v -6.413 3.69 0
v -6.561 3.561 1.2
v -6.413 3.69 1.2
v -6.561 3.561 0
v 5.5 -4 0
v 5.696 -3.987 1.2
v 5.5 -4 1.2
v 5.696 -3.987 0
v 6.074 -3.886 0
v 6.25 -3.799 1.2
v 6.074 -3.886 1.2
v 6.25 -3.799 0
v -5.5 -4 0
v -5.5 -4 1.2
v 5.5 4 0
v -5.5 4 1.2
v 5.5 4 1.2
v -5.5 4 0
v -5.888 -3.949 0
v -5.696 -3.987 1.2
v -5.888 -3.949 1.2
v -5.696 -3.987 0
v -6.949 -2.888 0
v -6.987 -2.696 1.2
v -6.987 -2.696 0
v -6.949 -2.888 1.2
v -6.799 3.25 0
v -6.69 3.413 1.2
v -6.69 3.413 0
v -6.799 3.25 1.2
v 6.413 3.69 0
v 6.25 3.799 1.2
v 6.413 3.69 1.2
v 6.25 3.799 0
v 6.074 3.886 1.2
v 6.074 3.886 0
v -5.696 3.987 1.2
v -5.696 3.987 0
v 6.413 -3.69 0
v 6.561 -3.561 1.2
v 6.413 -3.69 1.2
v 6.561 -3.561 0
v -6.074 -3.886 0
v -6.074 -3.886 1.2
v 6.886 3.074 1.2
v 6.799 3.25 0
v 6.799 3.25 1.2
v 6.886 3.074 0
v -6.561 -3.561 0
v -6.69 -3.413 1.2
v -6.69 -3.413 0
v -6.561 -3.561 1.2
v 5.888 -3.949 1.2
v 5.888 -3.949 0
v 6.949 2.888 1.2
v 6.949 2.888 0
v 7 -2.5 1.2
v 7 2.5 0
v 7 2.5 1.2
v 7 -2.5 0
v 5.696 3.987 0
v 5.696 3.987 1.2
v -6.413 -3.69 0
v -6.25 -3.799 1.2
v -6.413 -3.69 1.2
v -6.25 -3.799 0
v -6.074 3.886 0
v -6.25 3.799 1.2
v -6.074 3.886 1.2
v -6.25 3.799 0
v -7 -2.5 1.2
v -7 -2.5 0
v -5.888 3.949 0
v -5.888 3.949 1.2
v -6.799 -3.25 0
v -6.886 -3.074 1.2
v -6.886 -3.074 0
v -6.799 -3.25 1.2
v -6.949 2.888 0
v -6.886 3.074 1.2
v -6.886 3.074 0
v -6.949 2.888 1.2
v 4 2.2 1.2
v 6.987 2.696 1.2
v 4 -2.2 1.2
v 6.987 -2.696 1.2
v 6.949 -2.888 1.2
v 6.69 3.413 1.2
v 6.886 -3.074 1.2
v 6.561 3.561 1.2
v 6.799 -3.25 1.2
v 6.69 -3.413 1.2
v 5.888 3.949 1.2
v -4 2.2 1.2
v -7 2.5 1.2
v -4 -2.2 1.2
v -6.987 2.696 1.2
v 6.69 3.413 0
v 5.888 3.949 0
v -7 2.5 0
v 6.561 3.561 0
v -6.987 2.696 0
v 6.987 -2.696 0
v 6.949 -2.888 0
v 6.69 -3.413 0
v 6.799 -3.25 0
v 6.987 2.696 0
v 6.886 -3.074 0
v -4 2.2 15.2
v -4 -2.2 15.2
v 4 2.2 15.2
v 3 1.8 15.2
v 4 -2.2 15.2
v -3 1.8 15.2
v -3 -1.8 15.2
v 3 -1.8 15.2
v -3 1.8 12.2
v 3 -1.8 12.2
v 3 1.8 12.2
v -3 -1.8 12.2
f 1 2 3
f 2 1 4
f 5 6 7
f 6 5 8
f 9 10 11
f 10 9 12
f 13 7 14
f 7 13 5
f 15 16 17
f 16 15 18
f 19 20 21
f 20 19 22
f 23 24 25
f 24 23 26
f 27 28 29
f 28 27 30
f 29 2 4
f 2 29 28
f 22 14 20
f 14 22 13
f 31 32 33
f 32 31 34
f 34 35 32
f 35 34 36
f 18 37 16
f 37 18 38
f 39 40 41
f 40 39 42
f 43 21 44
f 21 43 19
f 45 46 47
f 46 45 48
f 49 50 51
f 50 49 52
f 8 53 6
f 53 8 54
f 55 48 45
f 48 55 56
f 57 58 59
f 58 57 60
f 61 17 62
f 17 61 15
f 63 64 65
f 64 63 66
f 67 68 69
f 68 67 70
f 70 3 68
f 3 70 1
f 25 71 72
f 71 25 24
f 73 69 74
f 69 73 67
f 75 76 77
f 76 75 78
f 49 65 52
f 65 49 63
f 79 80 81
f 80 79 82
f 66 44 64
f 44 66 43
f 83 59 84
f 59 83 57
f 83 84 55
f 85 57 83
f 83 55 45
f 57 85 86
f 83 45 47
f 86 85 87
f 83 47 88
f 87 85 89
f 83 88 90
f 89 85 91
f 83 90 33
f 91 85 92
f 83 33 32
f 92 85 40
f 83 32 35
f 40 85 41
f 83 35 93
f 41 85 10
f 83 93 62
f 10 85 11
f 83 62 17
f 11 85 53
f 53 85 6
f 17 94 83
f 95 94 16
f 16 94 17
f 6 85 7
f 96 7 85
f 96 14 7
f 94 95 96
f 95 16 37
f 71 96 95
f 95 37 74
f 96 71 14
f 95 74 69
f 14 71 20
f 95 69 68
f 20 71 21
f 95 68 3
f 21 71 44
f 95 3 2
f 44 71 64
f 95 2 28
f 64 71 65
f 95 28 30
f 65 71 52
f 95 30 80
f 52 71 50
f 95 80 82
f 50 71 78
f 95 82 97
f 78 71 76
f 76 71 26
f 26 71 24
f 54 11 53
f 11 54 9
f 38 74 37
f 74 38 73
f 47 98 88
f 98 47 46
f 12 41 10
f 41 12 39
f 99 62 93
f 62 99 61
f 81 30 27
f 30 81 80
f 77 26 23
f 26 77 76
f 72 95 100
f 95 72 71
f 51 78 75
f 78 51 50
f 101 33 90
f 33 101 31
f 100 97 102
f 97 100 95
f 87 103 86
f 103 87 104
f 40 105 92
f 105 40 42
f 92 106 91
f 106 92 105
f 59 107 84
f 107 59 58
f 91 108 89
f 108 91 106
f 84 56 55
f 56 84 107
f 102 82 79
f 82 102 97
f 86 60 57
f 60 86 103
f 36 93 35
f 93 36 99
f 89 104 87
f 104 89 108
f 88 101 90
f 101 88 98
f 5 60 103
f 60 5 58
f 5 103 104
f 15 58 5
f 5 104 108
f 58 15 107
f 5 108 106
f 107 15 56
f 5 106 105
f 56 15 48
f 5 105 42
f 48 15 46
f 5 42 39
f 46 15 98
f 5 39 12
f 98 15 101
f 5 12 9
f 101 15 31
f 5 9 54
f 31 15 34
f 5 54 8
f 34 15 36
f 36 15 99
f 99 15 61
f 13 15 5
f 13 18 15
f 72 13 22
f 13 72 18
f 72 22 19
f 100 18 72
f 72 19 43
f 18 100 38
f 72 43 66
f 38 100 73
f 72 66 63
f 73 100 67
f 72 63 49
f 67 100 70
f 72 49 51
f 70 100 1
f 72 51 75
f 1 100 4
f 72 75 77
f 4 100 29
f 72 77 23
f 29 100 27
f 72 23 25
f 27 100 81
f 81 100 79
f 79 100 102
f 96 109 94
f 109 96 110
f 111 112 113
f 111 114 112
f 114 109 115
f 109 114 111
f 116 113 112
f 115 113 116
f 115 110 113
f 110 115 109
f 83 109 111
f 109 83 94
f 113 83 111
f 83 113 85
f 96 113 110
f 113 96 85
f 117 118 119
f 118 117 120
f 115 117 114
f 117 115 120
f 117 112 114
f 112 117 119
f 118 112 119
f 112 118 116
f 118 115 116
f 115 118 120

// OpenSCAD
// ============================================================
// tx_switch_cap.scad  -  Gesture TX enclosure, SWITCH CAP
// Rebuilt as editable OpenSCAD from tx_switch_cap.stl
// Units: mm. Same coordinates as the STL, centred on X=0, Y=0.
// Dimensions were measured from cross-sections of the STL (about +/-0.05 mm).
// ============================================================

$fn = 48;

// ---- Overlay the original STL as a ghost, to compare ----
show_original = false;                // true = also draw the original STL
original_file = "tx_switch_cap.stl";  // keep it next to this .scad file

// ---- Flange (sits against the inside of the lid) ----
flange_w = 14;     // X
flange_d = 8;      // Y
flange_t = 1.2;    // thickness
flange_r = 1.5;    // corner radius

// ---- Stem (passes through the lid switch window) ----
stem_w = 8;        // X
stem_d = 4.4;      // Y
total_h = 15.2;    // overall height

// ---- Socket in the top of the stem (fits over the switch button) ----
sock_w = 6;        // X
sock_d = 3.6;      // Y
sock_z = 12.2;     // socket floor height; open above this

// ============================================================
module rrect2d(w, d, r) {
  offset(r = r) square([w - 2*r, d - 2*r], center = true);
}

difference() {
  union() {
    linear_extrude(height = flange_t) rrect2d(flange_w, flange_d, flange_r);
    translate([0, 0, flange_t - 0.01])
      linear_extrude(height = total_h - flange_t + 0.01)
        square([stem_w, stem_d], center = true);
  }
  translate([0, 0, sock_z])
    linear_extrude(height = total_h - sock_z + 0.1)
      square([sock_w, sock_d], center = true);
}

if (show_original) { %import(original_file); }
